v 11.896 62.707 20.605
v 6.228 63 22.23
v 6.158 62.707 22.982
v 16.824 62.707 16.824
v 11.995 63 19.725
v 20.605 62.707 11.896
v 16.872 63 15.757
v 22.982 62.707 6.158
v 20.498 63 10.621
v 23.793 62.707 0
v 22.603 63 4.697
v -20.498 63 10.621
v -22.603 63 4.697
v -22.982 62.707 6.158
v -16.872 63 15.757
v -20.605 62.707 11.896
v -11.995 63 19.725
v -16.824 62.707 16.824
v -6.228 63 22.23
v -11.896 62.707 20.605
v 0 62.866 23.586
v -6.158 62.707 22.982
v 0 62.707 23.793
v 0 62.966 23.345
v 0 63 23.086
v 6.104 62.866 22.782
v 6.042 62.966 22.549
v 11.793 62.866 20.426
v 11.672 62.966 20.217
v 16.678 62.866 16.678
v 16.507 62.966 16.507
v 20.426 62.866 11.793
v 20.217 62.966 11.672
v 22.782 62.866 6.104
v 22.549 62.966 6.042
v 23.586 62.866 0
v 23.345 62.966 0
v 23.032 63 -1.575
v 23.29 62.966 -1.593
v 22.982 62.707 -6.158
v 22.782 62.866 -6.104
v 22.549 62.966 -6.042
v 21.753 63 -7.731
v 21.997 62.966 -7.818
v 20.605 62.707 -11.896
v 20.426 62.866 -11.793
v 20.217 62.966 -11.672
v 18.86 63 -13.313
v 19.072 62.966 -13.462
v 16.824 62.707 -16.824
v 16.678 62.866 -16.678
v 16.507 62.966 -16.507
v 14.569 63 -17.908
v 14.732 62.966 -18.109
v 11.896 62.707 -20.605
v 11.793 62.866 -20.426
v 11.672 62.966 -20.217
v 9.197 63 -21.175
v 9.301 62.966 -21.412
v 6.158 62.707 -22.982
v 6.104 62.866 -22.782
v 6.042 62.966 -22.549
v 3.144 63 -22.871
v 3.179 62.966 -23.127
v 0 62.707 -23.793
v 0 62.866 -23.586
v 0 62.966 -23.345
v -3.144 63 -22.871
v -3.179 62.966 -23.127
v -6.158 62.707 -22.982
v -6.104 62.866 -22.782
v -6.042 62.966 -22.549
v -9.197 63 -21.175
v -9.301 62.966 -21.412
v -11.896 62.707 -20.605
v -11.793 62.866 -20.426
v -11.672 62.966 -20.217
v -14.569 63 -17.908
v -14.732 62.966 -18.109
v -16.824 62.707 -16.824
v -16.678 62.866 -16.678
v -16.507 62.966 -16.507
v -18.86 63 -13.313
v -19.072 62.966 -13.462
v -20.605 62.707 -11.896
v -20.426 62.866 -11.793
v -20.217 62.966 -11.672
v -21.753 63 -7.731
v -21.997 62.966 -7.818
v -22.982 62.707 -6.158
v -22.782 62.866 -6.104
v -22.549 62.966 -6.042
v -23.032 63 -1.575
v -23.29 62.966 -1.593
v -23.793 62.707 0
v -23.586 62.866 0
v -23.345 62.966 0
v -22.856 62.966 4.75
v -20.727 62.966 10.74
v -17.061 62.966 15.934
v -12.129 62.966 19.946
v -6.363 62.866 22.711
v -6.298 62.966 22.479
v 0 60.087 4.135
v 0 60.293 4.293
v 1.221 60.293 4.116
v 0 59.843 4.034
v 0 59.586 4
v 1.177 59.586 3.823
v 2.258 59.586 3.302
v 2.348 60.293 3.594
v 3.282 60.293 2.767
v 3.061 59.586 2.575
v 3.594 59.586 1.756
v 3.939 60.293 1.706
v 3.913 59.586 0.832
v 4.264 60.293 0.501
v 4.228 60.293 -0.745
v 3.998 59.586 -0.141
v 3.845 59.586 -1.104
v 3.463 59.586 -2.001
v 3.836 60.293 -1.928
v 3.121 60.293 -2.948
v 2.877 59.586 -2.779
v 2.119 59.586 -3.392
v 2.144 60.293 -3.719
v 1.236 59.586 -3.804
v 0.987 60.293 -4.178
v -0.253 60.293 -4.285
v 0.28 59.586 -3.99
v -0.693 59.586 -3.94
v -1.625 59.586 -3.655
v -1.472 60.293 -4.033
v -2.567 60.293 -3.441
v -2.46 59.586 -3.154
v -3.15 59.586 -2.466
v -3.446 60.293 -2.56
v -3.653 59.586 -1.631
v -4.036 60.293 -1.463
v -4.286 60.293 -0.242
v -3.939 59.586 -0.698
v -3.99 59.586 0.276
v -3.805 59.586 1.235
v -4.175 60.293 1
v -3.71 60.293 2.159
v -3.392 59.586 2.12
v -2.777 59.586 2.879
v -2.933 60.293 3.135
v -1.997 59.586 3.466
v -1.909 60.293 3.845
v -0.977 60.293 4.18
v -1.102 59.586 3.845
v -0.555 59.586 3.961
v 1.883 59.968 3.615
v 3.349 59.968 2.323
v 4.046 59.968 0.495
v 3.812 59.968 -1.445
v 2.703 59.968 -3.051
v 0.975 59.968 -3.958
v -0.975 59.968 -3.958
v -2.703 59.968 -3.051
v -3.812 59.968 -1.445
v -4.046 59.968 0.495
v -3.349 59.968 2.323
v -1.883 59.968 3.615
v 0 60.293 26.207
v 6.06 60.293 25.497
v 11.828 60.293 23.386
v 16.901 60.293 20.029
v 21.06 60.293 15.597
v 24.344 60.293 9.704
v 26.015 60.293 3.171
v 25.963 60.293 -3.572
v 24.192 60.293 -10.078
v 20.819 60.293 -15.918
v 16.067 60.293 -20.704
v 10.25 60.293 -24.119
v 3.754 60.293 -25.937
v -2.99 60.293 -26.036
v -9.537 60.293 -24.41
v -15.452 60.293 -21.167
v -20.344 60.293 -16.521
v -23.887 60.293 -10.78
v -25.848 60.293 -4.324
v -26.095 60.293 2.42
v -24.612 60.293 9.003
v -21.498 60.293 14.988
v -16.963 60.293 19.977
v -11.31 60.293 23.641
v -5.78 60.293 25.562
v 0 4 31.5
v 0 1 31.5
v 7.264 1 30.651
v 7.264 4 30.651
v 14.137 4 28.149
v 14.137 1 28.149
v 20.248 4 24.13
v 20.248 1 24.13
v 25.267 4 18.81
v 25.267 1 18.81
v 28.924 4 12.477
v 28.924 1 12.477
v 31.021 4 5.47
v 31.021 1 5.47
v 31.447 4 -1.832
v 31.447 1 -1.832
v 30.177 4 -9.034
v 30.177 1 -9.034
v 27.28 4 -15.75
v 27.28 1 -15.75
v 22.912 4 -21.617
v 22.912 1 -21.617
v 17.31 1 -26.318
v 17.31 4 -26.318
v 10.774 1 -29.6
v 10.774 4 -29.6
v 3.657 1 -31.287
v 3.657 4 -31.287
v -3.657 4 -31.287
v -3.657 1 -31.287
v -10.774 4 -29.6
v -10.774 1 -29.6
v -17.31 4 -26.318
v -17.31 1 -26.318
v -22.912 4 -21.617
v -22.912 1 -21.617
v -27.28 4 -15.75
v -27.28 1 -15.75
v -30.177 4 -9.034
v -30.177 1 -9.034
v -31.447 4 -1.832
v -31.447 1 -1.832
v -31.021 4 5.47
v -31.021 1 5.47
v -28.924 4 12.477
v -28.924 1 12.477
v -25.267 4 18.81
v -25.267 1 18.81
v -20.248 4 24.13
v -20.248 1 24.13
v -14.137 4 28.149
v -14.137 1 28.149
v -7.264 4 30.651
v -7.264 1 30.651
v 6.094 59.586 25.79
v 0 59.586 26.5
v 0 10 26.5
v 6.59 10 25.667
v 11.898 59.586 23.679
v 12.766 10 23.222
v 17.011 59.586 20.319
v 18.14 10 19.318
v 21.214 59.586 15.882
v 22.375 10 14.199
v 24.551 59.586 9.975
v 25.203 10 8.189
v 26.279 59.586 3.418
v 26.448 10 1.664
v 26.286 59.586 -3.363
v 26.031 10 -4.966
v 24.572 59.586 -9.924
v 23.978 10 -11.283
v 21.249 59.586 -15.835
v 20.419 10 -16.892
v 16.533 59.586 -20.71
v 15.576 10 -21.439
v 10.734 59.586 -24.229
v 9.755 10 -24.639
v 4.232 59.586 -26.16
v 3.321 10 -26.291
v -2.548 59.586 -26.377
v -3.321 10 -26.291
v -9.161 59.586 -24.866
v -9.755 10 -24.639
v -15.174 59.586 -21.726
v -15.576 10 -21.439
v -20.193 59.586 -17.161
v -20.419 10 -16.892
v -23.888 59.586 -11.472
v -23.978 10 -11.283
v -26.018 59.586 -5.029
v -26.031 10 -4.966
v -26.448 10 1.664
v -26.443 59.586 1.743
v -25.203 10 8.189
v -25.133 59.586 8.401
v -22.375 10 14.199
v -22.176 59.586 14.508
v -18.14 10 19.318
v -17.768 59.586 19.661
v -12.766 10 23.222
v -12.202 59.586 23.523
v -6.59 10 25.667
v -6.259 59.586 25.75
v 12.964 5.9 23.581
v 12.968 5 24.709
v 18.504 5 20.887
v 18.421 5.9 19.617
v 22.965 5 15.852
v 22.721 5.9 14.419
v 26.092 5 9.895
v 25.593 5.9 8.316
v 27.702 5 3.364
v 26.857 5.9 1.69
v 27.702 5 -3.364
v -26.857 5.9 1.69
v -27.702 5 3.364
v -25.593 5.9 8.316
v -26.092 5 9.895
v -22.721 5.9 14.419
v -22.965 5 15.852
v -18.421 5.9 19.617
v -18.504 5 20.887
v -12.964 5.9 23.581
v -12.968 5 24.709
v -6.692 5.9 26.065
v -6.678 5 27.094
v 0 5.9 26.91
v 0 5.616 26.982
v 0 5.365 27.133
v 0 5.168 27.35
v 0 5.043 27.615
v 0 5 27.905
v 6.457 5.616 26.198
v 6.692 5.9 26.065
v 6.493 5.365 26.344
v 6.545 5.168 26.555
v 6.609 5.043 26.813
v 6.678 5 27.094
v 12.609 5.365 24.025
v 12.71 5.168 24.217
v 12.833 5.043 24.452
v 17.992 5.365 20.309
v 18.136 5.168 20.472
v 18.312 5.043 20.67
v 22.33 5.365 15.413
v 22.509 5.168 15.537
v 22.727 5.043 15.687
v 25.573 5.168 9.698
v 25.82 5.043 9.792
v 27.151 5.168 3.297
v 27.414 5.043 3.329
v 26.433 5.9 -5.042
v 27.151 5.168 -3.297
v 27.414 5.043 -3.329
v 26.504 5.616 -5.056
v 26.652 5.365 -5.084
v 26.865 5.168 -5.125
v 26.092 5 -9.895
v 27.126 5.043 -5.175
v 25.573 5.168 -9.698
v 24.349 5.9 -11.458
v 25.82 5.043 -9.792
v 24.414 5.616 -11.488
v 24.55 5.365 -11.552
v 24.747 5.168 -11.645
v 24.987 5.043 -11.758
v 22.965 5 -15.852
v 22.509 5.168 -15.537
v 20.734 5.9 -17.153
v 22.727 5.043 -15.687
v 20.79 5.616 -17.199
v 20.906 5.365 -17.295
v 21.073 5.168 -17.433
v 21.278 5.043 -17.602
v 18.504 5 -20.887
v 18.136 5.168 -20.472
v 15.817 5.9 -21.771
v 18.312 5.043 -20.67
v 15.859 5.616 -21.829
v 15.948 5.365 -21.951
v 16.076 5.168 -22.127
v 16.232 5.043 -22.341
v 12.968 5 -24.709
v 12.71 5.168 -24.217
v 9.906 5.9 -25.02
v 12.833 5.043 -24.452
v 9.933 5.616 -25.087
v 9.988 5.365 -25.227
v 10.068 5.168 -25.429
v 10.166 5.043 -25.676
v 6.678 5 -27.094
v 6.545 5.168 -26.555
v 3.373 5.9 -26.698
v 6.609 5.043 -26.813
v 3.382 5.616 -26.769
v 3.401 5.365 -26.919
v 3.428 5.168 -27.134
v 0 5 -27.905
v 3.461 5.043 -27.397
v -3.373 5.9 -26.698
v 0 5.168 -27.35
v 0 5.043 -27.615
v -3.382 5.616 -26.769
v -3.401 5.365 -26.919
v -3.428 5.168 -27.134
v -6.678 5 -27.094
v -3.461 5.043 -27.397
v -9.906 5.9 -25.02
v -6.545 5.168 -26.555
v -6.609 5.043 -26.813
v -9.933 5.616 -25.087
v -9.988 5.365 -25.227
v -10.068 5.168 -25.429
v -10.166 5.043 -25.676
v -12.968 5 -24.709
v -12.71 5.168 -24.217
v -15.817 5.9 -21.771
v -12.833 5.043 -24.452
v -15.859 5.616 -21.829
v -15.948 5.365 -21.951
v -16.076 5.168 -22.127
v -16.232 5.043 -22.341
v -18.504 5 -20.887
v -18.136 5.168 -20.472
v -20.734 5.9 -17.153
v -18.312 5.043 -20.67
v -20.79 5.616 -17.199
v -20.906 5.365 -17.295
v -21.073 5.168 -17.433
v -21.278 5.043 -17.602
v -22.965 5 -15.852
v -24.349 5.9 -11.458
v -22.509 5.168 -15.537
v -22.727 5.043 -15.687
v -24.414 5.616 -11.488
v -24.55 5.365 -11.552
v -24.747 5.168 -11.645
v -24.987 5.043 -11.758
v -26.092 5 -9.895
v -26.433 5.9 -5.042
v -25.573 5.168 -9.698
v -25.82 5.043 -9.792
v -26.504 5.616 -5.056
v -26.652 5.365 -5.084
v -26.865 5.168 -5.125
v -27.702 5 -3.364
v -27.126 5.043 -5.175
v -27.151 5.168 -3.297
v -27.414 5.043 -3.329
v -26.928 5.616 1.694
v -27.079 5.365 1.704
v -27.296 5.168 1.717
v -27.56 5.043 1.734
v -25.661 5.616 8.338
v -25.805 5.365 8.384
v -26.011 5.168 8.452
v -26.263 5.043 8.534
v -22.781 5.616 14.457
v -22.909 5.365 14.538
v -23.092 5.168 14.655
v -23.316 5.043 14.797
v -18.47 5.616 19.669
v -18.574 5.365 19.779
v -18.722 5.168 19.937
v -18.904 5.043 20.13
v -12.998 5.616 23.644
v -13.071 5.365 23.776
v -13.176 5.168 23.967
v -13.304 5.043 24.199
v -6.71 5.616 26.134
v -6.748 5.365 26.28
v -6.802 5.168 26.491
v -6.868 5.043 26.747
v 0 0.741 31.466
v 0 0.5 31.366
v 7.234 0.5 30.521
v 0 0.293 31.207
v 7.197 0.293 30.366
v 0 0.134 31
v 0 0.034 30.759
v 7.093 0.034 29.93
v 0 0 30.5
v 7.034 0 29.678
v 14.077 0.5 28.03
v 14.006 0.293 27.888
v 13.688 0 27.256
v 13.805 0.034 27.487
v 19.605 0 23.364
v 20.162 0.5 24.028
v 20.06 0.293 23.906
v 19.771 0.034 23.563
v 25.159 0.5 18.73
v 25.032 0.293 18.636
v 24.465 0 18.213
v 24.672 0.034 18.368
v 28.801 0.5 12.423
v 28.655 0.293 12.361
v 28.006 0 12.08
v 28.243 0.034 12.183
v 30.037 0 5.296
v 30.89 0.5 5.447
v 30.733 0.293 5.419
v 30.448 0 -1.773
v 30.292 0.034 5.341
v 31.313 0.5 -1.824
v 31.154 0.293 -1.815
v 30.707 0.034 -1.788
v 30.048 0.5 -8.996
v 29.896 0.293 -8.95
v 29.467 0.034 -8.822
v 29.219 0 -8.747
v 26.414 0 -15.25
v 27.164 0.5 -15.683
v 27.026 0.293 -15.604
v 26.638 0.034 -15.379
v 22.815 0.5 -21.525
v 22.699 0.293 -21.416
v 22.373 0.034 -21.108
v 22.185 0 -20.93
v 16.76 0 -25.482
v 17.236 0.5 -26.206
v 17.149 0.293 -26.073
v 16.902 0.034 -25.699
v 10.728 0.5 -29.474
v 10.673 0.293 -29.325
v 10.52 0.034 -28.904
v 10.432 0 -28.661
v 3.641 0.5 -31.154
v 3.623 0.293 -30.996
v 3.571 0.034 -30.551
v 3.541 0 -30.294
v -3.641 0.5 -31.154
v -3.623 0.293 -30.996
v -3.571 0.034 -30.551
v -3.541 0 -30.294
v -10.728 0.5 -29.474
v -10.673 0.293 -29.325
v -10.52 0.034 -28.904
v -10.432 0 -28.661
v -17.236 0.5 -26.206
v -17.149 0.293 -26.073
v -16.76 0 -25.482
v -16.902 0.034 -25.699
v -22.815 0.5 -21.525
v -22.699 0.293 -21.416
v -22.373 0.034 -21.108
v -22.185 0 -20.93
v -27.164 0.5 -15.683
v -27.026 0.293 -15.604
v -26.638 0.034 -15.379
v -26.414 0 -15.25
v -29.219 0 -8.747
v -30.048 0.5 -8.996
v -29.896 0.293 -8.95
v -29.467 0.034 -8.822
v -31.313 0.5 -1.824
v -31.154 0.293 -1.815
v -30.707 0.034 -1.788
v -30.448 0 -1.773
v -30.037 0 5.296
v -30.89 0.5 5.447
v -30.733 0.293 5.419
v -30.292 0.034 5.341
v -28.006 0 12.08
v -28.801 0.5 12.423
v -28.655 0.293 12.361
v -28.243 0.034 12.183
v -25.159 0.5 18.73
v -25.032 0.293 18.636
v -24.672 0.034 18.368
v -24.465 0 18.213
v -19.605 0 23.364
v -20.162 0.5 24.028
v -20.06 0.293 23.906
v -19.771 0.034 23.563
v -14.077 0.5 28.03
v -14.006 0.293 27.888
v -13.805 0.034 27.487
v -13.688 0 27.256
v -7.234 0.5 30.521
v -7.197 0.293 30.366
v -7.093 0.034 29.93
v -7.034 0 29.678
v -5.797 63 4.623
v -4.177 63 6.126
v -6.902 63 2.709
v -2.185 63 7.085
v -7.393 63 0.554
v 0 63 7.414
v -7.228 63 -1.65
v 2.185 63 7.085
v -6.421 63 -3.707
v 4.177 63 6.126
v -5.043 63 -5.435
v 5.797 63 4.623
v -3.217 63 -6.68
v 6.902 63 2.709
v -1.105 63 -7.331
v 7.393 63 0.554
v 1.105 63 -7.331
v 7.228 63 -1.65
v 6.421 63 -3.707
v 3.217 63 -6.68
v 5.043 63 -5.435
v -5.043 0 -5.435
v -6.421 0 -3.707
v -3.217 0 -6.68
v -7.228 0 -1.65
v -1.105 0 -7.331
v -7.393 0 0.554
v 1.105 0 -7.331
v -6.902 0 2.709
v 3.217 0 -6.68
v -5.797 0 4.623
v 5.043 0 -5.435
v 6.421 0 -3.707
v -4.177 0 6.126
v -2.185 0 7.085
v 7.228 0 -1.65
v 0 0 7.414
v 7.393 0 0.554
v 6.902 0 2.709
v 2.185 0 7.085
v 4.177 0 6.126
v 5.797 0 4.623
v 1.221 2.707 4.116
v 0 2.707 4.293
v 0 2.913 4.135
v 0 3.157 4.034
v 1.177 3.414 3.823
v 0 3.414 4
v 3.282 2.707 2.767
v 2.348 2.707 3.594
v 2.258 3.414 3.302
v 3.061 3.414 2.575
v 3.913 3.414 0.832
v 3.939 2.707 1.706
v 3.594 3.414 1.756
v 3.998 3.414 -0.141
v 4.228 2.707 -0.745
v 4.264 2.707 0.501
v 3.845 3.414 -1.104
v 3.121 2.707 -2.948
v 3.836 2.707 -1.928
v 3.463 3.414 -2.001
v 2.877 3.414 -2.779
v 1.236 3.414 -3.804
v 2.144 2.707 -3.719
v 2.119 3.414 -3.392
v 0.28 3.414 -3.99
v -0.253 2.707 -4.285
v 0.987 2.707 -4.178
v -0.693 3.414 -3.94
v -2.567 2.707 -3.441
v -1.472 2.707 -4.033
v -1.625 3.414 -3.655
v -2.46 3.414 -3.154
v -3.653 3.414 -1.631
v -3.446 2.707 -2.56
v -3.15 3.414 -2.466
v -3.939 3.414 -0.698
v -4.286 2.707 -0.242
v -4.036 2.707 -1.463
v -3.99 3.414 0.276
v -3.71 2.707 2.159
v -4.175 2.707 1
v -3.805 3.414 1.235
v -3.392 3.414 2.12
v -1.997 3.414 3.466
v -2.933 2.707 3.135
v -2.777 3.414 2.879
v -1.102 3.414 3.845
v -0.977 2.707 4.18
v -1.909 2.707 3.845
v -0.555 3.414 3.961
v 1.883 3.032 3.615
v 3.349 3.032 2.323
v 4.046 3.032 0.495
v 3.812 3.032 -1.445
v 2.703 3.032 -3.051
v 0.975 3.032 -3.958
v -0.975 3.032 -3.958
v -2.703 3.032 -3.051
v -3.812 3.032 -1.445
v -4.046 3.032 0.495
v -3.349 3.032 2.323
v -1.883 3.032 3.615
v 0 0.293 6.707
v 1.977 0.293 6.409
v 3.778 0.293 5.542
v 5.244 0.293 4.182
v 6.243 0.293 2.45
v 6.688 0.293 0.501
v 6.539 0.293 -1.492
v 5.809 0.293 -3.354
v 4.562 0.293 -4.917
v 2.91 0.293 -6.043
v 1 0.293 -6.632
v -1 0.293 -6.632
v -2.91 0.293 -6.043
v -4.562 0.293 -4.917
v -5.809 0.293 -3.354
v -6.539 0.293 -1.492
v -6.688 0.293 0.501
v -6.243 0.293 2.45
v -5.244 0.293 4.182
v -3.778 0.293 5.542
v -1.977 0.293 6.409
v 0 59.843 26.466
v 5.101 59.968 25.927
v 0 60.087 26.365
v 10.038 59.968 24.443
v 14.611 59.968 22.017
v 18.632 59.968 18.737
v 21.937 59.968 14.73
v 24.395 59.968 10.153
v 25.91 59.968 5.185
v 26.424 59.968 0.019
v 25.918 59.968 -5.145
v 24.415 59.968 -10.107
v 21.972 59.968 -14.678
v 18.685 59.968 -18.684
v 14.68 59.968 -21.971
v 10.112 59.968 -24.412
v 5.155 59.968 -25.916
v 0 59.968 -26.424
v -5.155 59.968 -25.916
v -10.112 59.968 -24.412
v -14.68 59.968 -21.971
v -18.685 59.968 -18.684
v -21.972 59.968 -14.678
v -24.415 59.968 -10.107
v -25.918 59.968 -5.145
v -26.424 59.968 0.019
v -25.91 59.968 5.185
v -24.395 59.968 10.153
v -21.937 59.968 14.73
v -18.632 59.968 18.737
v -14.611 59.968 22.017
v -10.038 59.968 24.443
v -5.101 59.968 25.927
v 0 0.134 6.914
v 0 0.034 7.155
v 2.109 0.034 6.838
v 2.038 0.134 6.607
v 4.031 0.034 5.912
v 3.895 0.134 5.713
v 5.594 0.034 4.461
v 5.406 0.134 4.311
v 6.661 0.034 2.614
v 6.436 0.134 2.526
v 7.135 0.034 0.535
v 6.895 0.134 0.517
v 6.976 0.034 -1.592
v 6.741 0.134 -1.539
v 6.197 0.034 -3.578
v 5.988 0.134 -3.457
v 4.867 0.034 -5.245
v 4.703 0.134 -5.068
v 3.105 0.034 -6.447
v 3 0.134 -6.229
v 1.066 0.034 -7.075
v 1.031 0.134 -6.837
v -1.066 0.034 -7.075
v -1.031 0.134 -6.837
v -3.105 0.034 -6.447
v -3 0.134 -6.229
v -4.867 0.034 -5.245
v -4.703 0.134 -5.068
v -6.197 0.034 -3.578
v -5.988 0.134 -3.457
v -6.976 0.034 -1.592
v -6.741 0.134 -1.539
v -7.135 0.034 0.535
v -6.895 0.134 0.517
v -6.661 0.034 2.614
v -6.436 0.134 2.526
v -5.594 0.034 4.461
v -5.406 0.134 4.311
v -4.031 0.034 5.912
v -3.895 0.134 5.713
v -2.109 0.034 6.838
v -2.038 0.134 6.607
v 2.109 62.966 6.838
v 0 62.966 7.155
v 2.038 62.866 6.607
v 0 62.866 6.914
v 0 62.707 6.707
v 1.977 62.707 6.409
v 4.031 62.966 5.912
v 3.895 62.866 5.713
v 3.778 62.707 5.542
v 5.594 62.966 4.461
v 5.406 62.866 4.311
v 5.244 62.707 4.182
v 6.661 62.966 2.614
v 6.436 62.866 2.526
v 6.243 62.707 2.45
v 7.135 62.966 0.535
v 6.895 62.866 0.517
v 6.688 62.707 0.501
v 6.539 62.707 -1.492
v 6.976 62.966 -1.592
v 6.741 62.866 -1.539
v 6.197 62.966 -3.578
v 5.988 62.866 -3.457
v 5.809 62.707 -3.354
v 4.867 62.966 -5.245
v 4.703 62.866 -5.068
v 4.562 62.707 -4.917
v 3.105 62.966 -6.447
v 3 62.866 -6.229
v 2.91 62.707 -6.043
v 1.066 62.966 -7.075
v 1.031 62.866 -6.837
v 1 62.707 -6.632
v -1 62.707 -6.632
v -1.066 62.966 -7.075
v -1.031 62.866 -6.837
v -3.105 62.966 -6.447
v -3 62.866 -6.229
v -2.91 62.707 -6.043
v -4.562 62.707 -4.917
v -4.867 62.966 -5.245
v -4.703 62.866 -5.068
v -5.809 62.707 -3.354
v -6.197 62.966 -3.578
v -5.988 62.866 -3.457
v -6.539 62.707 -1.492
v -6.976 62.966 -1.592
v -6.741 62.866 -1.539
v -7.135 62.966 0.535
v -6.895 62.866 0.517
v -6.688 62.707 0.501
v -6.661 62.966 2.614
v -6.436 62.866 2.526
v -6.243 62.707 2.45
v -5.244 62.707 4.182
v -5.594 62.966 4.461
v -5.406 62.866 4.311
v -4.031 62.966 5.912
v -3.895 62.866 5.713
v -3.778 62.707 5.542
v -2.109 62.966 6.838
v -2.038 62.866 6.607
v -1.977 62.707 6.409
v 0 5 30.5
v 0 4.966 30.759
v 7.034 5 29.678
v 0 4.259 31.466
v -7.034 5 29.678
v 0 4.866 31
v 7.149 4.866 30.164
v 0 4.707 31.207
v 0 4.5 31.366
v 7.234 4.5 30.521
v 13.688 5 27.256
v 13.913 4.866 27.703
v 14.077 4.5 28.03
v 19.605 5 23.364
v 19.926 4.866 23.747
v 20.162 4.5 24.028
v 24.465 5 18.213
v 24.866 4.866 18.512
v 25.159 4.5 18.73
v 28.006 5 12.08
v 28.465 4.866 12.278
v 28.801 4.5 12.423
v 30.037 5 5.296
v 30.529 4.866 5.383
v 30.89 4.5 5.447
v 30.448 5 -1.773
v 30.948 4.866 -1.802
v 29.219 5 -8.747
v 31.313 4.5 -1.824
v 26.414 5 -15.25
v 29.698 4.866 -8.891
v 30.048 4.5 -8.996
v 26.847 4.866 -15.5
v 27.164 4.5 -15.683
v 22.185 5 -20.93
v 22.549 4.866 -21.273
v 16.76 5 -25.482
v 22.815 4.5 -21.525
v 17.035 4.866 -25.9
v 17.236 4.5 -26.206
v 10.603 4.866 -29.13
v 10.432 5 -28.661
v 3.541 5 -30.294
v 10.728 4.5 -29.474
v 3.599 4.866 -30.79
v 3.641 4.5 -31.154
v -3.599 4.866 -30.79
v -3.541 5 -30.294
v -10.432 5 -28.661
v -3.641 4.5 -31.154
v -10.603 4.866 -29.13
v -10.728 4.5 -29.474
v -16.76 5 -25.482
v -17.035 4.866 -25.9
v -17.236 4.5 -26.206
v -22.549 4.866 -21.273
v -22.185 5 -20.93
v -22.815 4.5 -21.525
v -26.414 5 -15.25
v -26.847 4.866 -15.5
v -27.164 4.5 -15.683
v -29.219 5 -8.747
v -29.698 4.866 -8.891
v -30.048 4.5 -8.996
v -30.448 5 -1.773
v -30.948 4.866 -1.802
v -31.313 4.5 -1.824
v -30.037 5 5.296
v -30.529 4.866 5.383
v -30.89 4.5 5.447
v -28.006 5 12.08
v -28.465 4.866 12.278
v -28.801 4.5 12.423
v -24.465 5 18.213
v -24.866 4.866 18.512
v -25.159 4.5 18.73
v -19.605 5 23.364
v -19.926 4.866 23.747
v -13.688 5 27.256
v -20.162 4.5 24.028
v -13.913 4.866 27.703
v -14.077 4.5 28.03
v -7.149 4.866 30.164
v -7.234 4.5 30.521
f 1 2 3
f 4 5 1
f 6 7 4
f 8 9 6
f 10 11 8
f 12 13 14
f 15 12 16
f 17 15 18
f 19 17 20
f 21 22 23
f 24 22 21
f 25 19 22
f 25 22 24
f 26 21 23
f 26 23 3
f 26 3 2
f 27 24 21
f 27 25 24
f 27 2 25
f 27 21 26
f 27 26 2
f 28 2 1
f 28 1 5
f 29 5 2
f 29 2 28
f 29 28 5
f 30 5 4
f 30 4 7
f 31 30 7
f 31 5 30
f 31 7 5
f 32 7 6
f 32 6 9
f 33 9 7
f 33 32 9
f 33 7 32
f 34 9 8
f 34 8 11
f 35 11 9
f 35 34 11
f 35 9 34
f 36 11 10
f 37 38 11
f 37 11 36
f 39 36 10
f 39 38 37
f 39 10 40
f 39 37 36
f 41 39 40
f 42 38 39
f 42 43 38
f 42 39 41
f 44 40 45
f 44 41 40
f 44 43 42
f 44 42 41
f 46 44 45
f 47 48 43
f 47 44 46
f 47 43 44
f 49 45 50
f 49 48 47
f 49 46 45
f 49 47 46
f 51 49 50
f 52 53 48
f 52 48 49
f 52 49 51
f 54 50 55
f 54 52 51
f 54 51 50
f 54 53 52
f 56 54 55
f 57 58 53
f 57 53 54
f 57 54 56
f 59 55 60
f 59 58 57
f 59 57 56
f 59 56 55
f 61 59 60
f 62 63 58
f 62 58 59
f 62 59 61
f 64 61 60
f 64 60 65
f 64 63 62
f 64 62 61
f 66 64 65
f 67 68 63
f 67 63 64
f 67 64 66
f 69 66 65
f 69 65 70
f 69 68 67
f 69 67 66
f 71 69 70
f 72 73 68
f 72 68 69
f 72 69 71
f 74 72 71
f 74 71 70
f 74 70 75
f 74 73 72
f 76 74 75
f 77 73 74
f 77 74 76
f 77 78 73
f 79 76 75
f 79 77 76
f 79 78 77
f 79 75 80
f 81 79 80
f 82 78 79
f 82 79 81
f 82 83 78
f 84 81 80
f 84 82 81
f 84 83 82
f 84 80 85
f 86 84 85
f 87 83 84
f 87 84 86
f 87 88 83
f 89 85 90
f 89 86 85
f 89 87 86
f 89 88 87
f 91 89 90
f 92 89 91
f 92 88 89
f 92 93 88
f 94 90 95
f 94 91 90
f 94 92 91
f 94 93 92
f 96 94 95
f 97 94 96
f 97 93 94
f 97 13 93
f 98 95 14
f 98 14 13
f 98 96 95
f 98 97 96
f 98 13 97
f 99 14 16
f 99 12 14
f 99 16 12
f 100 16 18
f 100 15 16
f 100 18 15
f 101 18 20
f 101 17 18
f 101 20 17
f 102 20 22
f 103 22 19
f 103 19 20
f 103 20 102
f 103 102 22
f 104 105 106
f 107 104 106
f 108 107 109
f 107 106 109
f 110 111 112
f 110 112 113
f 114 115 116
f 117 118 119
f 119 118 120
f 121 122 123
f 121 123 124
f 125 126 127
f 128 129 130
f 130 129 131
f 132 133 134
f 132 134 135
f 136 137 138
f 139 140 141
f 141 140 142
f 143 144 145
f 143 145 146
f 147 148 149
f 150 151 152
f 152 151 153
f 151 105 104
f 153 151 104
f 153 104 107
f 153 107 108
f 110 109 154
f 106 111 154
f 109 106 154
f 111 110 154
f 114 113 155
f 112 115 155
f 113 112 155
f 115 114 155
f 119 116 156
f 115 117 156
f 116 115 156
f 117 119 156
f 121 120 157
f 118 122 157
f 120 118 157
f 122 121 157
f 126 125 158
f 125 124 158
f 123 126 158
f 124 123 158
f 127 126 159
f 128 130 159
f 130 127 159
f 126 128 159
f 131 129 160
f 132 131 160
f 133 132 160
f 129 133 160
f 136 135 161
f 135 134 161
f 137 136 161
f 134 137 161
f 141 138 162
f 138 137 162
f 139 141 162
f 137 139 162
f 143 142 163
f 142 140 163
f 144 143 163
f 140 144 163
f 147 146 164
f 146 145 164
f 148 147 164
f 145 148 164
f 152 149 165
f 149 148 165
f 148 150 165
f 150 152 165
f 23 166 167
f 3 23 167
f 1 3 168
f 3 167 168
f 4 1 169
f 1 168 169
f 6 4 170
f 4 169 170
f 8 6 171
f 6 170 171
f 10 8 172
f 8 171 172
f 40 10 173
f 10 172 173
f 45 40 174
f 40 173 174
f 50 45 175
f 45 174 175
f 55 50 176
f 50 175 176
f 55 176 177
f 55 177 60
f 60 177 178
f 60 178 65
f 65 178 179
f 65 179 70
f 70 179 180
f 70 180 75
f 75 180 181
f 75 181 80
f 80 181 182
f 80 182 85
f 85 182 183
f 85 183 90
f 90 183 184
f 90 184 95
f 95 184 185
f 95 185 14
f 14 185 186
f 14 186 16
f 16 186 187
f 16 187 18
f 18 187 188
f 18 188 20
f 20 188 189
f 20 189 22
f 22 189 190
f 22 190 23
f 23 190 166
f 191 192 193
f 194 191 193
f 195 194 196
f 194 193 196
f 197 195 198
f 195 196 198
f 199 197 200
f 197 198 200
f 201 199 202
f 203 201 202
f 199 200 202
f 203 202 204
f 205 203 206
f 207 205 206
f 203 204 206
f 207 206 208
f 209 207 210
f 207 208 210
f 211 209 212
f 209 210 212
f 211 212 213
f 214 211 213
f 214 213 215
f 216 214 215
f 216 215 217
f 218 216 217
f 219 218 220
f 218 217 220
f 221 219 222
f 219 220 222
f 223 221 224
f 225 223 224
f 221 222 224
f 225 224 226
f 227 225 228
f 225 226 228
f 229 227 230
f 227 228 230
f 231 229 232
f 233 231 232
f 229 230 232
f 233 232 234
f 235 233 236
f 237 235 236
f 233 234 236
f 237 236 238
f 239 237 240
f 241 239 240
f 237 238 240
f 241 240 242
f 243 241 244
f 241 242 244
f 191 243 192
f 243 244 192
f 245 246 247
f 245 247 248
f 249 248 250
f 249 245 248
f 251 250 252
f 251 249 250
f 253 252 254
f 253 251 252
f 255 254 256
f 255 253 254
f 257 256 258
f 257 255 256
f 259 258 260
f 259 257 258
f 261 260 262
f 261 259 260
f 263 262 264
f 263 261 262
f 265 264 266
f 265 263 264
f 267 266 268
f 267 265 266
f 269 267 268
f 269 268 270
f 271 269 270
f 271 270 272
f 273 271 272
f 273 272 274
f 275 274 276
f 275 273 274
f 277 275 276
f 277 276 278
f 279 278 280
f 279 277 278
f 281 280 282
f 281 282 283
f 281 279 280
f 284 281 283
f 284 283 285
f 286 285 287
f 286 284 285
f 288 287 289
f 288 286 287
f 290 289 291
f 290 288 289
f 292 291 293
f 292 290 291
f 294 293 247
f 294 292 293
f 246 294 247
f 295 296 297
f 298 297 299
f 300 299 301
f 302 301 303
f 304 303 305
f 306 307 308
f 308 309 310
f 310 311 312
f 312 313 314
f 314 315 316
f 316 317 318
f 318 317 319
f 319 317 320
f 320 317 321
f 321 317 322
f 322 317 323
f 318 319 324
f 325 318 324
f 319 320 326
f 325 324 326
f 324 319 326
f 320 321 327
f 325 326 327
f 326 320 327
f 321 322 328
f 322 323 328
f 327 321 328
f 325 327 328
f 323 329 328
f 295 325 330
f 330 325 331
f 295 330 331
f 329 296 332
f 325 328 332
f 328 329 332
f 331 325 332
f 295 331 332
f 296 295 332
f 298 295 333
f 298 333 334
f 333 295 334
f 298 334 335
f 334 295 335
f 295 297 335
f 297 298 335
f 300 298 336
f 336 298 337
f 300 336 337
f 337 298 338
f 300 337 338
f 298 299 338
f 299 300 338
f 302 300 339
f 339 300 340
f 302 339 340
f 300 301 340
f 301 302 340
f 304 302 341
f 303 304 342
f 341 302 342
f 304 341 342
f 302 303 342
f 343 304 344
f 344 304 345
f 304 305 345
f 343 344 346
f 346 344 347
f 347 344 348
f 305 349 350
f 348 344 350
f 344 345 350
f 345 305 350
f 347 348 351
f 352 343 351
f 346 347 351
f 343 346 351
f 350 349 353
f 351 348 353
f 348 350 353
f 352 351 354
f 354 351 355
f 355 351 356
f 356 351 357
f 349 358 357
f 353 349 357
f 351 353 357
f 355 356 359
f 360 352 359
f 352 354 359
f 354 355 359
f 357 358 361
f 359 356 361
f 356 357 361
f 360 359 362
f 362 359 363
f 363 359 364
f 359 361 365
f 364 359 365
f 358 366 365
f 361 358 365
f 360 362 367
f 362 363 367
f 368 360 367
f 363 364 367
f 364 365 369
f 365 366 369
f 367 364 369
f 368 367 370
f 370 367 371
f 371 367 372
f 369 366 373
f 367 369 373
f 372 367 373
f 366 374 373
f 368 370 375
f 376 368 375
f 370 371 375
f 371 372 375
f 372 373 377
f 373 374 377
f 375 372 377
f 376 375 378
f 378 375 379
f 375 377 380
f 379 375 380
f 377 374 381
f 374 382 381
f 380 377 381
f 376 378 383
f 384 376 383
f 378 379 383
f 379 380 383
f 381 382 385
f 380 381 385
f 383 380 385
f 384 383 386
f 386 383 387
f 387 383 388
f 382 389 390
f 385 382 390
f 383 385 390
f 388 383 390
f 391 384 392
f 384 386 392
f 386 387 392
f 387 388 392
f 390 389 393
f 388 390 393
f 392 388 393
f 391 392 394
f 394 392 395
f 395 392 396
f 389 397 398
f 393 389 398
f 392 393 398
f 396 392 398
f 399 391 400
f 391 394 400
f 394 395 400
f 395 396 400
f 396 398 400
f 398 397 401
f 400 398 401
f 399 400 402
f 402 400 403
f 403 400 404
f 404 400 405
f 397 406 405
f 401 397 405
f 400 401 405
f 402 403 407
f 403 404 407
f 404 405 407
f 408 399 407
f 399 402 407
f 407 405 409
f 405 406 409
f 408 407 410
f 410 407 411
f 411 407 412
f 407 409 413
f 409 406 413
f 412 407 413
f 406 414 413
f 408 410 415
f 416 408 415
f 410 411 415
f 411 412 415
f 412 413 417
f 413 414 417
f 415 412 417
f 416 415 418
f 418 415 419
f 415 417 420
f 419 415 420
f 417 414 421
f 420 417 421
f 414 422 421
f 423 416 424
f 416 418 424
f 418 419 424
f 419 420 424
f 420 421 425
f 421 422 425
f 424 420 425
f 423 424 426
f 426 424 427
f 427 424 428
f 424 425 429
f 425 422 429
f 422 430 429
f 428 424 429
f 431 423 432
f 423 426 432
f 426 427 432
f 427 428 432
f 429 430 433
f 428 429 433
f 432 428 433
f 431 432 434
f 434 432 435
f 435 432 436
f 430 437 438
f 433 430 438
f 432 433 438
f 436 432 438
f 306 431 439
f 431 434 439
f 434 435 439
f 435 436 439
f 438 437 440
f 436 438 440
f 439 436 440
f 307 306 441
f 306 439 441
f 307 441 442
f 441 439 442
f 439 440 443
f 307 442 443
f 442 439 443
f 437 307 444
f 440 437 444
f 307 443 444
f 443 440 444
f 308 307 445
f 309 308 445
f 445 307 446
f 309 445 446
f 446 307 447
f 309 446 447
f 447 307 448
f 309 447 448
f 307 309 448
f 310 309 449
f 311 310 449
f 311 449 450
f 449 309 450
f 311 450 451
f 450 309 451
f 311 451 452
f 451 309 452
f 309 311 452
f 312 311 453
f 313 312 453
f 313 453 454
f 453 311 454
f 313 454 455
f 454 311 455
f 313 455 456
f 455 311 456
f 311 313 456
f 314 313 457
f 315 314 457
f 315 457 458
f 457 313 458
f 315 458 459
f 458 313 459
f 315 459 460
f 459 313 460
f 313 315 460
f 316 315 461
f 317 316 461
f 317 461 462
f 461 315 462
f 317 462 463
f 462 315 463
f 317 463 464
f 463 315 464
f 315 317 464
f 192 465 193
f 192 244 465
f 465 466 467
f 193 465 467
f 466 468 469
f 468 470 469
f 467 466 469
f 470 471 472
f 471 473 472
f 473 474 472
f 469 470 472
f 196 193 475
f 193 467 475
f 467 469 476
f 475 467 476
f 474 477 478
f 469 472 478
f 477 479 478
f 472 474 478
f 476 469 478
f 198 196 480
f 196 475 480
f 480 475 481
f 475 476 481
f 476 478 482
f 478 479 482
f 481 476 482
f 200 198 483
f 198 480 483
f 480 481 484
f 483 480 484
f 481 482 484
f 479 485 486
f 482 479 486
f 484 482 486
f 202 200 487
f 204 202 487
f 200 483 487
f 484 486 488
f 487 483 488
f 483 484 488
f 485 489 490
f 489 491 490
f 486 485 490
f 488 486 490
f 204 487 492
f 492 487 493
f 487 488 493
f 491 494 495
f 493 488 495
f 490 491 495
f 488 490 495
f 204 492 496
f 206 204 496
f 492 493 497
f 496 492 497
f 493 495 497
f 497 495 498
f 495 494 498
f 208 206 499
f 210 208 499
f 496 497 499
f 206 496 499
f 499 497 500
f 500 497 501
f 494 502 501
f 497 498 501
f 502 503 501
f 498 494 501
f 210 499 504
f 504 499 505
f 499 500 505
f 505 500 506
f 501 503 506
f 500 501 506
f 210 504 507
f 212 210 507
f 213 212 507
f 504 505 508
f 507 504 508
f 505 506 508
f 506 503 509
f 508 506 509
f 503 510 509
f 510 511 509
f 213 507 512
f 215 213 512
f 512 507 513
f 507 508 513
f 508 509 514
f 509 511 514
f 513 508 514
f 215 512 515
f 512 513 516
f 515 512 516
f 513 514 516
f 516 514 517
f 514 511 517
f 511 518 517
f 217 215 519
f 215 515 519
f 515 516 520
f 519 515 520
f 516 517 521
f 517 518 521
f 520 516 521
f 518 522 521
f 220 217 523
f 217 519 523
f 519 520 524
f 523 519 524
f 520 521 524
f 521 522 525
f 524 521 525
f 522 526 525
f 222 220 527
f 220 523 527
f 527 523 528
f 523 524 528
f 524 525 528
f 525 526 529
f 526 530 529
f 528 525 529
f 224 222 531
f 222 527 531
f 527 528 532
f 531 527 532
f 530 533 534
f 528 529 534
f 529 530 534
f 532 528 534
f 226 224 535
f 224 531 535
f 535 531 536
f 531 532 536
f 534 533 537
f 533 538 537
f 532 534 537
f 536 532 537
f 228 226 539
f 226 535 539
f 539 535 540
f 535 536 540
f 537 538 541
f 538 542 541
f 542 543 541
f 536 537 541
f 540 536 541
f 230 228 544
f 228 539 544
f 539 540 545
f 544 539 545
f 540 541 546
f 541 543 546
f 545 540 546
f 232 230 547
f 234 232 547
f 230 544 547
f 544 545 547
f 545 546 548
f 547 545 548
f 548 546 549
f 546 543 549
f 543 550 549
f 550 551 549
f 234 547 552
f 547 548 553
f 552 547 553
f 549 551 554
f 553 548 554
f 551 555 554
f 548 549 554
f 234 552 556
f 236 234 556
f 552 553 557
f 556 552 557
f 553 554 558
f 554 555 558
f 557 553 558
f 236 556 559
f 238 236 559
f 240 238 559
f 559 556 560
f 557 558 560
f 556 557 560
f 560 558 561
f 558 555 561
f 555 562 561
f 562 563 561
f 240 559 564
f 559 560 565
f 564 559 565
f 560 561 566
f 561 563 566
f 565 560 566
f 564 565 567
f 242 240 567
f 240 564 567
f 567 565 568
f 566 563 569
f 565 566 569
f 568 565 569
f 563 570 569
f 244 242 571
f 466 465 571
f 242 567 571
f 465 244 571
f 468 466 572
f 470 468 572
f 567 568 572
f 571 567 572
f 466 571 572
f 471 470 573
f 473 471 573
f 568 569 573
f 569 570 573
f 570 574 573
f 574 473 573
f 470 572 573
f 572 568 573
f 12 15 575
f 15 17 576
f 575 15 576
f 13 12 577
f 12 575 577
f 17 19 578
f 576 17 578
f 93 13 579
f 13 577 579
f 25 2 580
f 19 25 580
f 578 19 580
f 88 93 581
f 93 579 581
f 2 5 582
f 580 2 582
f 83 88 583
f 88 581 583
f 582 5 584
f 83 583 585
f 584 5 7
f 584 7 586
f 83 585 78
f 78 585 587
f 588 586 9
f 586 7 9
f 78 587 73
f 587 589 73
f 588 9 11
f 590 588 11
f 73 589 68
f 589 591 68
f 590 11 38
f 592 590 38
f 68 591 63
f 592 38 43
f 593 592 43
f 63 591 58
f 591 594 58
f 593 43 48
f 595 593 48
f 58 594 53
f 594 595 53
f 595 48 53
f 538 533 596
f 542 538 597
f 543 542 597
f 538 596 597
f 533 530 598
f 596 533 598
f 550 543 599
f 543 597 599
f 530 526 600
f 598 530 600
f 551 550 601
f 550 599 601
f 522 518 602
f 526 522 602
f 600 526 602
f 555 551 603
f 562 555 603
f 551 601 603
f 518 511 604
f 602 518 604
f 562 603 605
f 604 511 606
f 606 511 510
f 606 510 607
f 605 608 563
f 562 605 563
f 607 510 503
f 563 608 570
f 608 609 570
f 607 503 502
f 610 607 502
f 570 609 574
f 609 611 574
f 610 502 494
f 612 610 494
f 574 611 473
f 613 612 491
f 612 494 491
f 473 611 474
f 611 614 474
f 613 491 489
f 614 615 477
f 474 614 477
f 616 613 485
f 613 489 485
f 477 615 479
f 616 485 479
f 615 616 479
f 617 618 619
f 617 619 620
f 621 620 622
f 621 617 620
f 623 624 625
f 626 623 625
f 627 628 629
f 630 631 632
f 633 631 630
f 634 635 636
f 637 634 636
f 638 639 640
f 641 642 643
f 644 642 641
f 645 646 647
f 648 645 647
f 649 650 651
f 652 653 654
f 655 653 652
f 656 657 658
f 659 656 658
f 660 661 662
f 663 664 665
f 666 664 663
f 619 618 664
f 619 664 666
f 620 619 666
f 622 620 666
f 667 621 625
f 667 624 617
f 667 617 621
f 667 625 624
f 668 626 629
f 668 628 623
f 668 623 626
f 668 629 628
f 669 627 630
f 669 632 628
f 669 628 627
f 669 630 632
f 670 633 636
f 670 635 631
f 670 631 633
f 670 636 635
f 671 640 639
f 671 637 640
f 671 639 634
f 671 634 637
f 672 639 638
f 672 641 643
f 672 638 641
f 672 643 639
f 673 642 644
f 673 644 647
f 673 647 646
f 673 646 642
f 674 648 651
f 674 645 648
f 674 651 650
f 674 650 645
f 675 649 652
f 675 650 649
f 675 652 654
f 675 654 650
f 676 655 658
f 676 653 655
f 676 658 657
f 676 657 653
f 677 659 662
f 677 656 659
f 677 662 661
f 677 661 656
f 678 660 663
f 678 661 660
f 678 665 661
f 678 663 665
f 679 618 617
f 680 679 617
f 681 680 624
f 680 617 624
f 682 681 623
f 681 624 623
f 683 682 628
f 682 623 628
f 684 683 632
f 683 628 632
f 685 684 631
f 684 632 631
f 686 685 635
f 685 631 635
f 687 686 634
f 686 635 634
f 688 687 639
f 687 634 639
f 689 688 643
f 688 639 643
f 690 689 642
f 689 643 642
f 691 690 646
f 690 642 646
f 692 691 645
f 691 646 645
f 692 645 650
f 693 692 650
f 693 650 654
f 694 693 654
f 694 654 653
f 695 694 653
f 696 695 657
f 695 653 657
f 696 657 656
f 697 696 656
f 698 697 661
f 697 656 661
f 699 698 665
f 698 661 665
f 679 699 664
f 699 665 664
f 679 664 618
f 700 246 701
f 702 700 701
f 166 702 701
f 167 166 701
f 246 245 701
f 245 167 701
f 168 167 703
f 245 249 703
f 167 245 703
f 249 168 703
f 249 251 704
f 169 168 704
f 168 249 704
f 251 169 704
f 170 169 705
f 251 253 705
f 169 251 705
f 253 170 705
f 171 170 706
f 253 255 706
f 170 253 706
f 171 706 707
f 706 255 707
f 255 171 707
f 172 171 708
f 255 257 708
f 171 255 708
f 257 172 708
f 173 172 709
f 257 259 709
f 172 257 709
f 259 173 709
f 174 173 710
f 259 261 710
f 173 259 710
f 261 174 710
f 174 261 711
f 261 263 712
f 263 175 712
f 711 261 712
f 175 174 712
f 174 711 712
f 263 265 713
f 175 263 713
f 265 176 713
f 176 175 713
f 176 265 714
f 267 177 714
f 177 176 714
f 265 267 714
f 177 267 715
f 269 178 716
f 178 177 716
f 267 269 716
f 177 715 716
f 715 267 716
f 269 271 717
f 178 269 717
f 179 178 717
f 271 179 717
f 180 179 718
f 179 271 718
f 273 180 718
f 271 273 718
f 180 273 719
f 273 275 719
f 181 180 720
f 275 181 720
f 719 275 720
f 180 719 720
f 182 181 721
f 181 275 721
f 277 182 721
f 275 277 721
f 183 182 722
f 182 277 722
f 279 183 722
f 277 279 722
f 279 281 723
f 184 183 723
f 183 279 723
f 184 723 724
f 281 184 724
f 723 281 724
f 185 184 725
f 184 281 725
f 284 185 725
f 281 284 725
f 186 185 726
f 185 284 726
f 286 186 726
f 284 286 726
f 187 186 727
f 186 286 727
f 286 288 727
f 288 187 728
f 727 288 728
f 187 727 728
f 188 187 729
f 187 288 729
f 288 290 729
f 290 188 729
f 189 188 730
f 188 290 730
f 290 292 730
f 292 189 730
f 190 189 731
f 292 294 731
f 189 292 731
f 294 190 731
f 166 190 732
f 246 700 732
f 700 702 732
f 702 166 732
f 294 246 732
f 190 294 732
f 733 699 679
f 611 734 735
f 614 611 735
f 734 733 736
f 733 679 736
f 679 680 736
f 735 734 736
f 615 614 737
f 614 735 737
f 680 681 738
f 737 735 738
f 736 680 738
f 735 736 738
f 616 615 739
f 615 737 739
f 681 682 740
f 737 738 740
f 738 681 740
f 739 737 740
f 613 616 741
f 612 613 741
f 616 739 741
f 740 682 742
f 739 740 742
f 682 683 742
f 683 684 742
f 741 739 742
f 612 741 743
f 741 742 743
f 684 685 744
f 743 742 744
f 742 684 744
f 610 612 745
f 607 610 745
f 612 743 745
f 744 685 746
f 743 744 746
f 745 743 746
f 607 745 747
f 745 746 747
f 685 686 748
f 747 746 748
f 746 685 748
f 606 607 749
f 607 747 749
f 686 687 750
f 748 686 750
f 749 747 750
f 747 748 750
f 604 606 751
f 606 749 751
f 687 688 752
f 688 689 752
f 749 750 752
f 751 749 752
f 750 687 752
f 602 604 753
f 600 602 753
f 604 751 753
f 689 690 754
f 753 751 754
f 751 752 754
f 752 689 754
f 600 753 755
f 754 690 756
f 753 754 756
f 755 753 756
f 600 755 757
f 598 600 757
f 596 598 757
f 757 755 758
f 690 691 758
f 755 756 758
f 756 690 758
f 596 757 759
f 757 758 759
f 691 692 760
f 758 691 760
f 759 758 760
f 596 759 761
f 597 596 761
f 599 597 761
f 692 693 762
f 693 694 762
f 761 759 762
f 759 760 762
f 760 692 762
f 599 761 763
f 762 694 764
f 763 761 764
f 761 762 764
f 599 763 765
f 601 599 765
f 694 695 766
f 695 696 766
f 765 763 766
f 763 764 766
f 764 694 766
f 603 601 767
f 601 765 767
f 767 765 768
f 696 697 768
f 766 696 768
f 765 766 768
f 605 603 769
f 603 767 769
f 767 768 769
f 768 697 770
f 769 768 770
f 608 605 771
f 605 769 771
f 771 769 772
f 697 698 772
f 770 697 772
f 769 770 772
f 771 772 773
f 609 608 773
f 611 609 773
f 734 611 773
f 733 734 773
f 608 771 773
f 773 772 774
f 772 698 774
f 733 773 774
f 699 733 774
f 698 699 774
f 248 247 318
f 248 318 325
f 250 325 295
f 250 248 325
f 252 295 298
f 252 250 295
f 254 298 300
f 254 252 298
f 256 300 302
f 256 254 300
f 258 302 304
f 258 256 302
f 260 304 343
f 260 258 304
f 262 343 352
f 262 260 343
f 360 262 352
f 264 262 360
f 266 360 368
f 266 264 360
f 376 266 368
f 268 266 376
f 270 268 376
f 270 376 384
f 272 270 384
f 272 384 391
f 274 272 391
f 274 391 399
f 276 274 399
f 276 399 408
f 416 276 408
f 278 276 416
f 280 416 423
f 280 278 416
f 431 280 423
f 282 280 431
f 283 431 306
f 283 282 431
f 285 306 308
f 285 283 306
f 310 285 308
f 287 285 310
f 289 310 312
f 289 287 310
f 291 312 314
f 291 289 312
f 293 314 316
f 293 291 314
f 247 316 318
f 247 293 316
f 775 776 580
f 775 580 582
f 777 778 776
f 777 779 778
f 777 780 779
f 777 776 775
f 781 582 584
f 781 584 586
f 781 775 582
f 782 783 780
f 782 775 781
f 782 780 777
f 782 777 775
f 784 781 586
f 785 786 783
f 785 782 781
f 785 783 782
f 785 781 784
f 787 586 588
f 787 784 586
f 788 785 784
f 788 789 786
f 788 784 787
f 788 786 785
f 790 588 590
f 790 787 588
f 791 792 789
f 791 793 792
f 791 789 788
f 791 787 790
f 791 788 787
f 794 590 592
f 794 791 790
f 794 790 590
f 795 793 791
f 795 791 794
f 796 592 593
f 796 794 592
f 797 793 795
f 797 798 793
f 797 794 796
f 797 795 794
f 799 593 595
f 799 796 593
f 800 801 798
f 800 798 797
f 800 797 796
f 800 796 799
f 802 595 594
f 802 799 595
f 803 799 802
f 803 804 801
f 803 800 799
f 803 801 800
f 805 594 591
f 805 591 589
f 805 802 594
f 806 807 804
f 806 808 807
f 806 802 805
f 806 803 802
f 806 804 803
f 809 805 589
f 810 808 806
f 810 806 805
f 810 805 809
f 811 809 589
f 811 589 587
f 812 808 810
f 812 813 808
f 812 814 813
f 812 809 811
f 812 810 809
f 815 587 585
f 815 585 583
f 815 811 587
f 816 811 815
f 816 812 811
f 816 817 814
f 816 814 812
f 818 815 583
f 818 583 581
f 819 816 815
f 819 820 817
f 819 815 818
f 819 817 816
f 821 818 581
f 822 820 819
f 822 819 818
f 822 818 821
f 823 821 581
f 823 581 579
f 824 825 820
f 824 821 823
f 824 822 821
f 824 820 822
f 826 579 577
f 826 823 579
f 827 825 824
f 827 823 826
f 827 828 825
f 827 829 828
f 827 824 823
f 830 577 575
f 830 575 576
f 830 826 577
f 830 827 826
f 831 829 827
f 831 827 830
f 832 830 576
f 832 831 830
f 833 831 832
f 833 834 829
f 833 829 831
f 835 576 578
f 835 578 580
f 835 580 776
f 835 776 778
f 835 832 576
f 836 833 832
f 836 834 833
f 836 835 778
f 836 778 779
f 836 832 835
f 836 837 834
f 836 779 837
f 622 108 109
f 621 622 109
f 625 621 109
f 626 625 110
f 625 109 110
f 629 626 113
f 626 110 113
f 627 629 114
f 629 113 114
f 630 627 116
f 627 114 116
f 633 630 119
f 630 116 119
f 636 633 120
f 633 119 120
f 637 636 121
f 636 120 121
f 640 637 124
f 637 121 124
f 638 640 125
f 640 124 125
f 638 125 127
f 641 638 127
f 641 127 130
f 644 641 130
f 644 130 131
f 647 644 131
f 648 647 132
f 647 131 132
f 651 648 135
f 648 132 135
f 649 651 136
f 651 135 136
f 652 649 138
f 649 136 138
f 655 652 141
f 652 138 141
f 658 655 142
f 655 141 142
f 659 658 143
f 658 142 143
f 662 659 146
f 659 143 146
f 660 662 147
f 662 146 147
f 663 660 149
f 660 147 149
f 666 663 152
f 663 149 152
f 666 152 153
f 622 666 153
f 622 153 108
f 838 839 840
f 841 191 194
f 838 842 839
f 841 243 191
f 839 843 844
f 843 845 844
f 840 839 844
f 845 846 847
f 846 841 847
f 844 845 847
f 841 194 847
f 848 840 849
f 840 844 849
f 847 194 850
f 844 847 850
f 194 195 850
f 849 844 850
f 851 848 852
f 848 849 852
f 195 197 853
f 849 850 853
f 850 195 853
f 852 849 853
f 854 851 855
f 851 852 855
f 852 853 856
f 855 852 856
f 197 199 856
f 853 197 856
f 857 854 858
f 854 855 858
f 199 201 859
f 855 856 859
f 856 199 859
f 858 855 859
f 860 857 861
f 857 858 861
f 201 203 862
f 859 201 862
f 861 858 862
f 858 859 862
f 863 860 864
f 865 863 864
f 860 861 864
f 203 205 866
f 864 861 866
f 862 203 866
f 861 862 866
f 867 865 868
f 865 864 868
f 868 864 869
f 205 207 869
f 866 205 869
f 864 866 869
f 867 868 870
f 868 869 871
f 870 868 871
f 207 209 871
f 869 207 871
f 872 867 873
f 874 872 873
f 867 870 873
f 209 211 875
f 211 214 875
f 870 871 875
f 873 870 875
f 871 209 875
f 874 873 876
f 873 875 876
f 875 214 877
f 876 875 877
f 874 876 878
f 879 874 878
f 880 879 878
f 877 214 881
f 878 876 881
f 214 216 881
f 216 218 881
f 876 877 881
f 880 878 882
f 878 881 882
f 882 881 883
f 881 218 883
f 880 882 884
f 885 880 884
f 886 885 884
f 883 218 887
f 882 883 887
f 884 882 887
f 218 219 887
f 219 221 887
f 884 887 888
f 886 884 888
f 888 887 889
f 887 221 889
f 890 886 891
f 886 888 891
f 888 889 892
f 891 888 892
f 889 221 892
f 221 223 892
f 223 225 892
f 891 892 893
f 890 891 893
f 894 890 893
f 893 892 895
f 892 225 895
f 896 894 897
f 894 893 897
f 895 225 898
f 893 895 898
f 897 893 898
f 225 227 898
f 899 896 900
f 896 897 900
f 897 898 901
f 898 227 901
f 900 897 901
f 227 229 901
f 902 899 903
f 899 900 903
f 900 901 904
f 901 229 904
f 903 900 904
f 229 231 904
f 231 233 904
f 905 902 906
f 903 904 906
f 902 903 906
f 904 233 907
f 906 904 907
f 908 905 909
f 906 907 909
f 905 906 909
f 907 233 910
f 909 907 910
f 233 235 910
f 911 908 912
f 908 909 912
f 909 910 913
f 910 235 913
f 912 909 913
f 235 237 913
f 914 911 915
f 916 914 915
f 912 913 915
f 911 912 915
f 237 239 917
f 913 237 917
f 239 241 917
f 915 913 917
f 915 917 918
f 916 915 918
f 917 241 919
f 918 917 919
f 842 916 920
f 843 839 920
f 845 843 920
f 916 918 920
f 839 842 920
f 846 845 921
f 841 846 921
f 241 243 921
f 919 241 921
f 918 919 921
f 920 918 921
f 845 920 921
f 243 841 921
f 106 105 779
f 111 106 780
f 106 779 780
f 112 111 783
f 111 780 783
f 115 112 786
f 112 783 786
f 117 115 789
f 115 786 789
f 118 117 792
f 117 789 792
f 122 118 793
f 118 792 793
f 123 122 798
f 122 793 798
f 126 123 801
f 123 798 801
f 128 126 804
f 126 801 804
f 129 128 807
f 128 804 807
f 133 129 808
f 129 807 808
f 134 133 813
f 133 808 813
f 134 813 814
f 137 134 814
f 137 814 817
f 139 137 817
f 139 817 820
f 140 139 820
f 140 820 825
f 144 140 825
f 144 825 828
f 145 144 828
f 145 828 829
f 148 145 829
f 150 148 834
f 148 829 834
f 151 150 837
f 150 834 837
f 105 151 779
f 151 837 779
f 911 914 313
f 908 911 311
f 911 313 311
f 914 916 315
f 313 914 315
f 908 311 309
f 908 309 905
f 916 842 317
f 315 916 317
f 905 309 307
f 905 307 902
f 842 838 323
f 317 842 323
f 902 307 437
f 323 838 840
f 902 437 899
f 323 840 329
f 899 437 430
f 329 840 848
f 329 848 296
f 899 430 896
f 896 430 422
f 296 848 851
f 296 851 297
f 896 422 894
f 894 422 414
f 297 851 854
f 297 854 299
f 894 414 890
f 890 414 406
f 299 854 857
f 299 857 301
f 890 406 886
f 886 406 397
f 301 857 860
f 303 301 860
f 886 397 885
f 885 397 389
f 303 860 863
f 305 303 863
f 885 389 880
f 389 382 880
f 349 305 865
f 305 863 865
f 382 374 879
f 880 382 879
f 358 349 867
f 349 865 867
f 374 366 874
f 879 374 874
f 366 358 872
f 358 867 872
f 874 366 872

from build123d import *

# Parameters (mm, degrees)
F0_W    = 58
F0_H    = 22.5
F2_SIZE = 3
F4_R    = 1


# Not quite as in the source:
# - a fillet or chamfer that OpenCascade refuses, or shapes differently, is made with other operations: its cross-section is extruded or revolved along the edge and cut away or added


with BuildPart() as f1:
    # F0 (on Right) → F1 (revolve)
    with BuildSketch(Plane.YZ):
        Polygon((0, 31.5), (0, 4), (5, 4), (5, 26.5), (5, 31.5), align=None)
        with Locations((34, 15.25)):
            Rectangle(F0_W, F0_H)
    revolve(axis=Axis((0, 38.0806664313, 0), (0, 1, 0)))

    # F2
    f2_edges = [f1.edges().sort_by_distance(p)[0] for p in [
        (0, 63, -26.5),
        (0, 63, -4),
        (0, 0, -4),
    ]]
    chamfer(f2_edges, length=F2_SIZE)

    # F3: chamfer of 5 x 0.5 on 1 edges, made by hand

    # F3_s1 → F3_t2 (revolve)
    with BuildSketch(Plane.YZ):
        Polygon((5, 27), (10, 26.5), (5, 26.5), align=None)
    revolve(axis=Axis((0, 5, 0), (0, 1, 0)))

    # F4
    f4_edges = [f1.edges().sort_by_distance(p)[0] for p in [
        (0, 0, -31.5),
        (0, 5, -31.5),
        (0, 5, -27),
        (0, 60, -26.5),
        (0, 63, -23.5),
        (0, 60, -4),
        (0, 63, -7),
        (0, 0, -7),
        (0, 3, -4),
    ]]
    fillet(f4_edges, radius=F4_R)


solid = f1.part
